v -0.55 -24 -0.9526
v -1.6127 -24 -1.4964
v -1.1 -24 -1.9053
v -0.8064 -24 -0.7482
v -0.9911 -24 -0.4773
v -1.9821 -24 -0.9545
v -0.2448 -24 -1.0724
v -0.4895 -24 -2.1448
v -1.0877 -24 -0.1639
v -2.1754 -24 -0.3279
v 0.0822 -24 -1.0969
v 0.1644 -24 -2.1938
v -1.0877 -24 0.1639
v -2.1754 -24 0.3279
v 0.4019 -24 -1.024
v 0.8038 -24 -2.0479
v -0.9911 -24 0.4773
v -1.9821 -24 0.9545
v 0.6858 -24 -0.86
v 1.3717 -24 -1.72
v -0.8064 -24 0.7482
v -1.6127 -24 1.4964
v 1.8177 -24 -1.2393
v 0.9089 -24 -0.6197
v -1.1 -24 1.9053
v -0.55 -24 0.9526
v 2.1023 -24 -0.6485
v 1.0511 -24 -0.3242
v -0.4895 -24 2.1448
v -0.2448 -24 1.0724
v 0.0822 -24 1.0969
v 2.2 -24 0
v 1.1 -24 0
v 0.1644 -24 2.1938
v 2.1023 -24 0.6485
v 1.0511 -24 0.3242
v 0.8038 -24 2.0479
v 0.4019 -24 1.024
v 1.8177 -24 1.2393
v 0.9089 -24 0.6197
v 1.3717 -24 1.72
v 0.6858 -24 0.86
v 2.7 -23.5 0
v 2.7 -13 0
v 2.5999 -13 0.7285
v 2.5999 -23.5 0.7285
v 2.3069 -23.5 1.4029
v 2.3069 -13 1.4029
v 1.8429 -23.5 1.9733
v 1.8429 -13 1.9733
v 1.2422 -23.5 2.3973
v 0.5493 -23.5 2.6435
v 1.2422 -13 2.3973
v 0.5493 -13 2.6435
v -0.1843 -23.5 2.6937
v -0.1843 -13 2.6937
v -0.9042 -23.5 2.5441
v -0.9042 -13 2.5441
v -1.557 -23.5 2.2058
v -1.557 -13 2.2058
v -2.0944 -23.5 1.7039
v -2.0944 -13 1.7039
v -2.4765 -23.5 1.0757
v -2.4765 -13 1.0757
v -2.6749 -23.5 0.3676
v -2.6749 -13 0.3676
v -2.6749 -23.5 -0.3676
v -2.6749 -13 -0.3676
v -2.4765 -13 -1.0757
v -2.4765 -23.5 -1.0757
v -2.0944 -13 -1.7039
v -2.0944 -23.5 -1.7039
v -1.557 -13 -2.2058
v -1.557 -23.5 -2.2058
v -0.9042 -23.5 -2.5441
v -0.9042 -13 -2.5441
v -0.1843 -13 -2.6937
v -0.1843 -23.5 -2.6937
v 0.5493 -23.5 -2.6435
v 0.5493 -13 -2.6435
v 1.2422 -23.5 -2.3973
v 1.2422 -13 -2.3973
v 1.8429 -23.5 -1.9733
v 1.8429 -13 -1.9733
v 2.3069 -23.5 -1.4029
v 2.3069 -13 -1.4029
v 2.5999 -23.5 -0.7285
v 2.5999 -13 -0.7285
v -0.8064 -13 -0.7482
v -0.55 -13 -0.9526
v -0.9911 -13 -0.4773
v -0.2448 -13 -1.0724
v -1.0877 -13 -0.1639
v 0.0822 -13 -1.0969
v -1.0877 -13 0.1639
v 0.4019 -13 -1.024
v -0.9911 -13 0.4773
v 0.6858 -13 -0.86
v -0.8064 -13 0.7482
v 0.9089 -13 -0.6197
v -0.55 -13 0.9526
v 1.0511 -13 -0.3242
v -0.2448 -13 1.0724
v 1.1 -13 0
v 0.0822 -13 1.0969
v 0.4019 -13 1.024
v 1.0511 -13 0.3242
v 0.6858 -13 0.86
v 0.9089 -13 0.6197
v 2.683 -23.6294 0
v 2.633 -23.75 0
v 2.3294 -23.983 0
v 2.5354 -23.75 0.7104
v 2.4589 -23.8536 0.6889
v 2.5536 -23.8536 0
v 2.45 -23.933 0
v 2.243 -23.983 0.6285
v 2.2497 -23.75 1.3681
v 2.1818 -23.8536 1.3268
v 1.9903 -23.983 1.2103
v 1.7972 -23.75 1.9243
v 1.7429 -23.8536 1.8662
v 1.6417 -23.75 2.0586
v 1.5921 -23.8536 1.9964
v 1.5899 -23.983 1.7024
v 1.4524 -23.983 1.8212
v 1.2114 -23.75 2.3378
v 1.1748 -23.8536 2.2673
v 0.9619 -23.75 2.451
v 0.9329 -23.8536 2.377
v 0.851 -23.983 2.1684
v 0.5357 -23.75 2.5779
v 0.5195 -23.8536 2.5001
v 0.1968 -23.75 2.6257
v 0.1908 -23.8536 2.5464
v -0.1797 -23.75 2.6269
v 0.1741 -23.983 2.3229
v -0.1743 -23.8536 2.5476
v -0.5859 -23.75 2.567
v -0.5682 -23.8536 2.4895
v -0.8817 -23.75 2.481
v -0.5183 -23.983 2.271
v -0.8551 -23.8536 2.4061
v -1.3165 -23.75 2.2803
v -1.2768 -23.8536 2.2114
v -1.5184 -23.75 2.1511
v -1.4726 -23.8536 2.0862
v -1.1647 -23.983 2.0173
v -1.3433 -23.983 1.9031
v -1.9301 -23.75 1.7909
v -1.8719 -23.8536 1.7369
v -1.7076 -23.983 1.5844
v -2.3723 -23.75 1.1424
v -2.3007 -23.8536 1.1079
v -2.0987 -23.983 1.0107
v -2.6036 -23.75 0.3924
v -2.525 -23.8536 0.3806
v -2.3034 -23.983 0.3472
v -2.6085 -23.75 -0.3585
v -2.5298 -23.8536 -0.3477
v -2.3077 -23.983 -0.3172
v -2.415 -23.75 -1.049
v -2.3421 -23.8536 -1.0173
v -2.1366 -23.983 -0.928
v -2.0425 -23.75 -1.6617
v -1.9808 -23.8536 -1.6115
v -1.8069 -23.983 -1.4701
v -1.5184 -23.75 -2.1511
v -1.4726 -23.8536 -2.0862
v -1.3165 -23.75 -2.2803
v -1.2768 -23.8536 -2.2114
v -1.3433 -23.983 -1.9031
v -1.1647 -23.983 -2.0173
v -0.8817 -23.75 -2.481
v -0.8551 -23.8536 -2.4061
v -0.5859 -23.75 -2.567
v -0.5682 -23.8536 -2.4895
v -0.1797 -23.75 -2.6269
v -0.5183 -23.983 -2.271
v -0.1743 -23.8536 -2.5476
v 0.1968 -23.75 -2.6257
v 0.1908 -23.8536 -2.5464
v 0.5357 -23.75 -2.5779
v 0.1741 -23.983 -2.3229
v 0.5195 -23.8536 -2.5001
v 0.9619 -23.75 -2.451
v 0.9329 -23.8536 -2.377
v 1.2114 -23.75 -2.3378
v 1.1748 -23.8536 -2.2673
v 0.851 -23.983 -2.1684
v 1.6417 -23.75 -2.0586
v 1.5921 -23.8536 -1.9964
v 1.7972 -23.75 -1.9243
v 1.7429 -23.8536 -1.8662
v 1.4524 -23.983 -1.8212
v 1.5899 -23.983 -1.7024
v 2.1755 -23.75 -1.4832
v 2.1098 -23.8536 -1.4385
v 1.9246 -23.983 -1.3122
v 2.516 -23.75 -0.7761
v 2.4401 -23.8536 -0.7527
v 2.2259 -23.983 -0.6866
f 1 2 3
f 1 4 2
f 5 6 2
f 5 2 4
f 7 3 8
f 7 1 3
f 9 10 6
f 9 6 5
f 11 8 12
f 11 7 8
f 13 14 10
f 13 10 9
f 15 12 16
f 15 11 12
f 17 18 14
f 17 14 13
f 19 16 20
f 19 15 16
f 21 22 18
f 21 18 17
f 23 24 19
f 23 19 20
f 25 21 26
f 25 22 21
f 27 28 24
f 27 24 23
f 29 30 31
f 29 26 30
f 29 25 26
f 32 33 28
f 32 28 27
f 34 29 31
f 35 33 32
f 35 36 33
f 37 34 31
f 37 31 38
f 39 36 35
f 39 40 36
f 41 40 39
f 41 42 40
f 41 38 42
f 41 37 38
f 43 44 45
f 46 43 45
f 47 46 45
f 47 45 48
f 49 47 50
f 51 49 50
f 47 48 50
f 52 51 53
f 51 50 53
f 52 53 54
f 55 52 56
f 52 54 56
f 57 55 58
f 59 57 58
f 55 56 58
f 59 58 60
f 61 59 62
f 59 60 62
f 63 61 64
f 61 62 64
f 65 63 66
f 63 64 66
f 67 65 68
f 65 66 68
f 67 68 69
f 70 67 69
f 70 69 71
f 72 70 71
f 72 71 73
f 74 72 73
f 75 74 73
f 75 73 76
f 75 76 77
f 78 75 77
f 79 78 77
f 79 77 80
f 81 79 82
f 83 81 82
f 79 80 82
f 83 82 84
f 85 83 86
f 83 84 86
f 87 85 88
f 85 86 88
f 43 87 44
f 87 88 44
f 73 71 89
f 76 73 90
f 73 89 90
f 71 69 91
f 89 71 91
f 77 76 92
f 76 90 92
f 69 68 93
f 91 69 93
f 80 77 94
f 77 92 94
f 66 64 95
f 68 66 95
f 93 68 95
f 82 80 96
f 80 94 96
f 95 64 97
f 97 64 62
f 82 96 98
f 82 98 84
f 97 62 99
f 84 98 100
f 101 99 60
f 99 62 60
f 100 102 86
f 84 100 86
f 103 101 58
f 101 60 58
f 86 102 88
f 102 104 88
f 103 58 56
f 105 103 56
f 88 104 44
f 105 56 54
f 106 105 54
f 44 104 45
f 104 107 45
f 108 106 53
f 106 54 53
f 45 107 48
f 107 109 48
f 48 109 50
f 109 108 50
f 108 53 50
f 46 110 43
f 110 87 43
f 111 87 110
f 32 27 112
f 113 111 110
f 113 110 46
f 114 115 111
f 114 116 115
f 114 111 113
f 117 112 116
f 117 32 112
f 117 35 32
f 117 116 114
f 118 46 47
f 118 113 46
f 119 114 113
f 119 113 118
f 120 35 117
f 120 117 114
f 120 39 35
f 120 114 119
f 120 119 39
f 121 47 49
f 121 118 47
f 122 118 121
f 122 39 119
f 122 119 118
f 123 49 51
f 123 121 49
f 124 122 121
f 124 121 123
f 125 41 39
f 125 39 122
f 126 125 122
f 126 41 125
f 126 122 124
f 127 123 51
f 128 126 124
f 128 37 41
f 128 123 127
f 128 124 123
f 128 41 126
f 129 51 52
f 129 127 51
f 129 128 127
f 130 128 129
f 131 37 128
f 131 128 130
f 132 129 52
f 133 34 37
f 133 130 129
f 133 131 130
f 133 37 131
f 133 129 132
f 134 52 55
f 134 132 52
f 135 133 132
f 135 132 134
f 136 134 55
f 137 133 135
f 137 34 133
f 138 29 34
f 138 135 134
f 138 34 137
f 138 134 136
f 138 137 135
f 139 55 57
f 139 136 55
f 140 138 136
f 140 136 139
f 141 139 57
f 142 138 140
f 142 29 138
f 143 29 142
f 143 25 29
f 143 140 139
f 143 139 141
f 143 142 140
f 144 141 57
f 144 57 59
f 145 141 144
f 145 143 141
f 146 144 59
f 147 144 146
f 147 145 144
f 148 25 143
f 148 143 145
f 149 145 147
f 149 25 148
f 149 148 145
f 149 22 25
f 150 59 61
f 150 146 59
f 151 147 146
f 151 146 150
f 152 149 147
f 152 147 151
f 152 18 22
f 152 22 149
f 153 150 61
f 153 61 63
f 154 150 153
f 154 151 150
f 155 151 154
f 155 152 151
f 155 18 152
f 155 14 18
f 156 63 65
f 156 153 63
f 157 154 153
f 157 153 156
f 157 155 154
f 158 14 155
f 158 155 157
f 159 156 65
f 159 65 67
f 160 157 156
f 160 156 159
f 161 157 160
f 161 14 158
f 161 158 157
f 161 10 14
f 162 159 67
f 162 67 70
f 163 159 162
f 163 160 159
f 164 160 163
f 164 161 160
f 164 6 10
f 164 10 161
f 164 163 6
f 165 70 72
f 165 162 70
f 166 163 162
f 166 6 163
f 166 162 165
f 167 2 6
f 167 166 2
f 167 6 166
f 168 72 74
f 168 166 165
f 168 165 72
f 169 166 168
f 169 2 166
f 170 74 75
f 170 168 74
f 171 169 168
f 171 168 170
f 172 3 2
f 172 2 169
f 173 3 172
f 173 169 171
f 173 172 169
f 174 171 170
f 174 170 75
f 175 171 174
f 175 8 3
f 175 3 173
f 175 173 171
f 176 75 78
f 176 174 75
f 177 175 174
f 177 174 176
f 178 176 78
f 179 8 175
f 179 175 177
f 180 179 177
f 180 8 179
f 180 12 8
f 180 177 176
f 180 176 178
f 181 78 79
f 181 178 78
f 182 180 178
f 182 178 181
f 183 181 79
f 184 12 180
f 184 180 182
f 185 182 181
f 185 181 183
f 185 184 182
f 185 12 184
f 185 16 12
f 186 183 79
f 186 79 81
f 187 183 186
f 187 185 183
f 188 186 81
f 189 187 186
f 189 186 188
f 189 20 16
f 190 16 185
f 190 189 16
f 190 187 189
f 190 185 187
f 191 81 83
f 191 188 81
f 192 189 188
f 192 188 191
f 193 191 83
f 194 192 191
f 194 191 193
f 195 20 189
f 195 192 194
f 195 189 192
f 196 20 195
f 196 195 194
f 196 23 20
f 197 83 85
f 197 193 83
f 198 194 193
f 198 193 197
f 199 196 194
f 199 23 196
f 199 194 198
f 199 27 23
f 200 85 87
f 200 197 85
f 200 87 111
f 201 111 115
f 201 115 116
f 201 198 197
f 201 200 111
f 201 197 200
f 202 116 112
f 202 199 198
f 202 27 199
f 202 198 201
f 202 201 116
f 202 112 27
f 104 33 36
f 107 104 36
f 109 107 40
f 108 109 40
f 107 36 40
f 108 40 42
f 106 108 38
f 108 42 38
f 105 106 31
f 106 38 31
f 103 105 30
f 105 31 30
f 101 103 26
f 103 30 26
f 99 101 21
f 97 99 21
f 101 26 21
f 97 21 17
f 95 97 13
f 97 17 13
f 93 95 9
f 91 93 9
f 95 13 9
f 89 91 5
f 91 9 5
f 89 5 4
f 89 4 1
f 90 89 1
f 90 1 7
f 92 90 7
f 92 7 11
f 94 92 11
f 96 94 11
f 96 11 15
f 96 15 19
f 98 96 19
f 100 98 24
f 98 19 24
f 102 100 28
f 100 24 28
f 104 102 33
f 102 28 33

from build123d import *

# Parameters (mm, degrees)
SKETCH051_R     = 2.7
PAD043_DEPTH    = 11
FILLET001_R     = 0.5
SKETCH050_R     = 1.1
POCKET005_DEPTH = 11


with BuildPart() as part:
    # Sketch051 (on Face1 of CopyFillet) → Pad043 (new body)
    with BuildSketch(Plane.XZ.offset(13)):
        Circle(SKETCH051_R)
    extrude(amount=PAD043_DEPTH)

    # Fillet001
    fillet001_edges = [part.edges().sort_by_distance(p)[0] for p in [
        (-2.7, -24, 0),
    ]]
    fillet(fillet001_edges, radius=FILLET001_R)

    # Sketch050 (on Face4 of Fillet001) → Pocket005 (cut)
    with BuildSketch(Plane.XZ.offset(24)):
        Circle(SKETCH050_R)
    extrude(amount=-POCKET005_DEPTH, mode=Mode.SUBTRACT)


solid = part.part
